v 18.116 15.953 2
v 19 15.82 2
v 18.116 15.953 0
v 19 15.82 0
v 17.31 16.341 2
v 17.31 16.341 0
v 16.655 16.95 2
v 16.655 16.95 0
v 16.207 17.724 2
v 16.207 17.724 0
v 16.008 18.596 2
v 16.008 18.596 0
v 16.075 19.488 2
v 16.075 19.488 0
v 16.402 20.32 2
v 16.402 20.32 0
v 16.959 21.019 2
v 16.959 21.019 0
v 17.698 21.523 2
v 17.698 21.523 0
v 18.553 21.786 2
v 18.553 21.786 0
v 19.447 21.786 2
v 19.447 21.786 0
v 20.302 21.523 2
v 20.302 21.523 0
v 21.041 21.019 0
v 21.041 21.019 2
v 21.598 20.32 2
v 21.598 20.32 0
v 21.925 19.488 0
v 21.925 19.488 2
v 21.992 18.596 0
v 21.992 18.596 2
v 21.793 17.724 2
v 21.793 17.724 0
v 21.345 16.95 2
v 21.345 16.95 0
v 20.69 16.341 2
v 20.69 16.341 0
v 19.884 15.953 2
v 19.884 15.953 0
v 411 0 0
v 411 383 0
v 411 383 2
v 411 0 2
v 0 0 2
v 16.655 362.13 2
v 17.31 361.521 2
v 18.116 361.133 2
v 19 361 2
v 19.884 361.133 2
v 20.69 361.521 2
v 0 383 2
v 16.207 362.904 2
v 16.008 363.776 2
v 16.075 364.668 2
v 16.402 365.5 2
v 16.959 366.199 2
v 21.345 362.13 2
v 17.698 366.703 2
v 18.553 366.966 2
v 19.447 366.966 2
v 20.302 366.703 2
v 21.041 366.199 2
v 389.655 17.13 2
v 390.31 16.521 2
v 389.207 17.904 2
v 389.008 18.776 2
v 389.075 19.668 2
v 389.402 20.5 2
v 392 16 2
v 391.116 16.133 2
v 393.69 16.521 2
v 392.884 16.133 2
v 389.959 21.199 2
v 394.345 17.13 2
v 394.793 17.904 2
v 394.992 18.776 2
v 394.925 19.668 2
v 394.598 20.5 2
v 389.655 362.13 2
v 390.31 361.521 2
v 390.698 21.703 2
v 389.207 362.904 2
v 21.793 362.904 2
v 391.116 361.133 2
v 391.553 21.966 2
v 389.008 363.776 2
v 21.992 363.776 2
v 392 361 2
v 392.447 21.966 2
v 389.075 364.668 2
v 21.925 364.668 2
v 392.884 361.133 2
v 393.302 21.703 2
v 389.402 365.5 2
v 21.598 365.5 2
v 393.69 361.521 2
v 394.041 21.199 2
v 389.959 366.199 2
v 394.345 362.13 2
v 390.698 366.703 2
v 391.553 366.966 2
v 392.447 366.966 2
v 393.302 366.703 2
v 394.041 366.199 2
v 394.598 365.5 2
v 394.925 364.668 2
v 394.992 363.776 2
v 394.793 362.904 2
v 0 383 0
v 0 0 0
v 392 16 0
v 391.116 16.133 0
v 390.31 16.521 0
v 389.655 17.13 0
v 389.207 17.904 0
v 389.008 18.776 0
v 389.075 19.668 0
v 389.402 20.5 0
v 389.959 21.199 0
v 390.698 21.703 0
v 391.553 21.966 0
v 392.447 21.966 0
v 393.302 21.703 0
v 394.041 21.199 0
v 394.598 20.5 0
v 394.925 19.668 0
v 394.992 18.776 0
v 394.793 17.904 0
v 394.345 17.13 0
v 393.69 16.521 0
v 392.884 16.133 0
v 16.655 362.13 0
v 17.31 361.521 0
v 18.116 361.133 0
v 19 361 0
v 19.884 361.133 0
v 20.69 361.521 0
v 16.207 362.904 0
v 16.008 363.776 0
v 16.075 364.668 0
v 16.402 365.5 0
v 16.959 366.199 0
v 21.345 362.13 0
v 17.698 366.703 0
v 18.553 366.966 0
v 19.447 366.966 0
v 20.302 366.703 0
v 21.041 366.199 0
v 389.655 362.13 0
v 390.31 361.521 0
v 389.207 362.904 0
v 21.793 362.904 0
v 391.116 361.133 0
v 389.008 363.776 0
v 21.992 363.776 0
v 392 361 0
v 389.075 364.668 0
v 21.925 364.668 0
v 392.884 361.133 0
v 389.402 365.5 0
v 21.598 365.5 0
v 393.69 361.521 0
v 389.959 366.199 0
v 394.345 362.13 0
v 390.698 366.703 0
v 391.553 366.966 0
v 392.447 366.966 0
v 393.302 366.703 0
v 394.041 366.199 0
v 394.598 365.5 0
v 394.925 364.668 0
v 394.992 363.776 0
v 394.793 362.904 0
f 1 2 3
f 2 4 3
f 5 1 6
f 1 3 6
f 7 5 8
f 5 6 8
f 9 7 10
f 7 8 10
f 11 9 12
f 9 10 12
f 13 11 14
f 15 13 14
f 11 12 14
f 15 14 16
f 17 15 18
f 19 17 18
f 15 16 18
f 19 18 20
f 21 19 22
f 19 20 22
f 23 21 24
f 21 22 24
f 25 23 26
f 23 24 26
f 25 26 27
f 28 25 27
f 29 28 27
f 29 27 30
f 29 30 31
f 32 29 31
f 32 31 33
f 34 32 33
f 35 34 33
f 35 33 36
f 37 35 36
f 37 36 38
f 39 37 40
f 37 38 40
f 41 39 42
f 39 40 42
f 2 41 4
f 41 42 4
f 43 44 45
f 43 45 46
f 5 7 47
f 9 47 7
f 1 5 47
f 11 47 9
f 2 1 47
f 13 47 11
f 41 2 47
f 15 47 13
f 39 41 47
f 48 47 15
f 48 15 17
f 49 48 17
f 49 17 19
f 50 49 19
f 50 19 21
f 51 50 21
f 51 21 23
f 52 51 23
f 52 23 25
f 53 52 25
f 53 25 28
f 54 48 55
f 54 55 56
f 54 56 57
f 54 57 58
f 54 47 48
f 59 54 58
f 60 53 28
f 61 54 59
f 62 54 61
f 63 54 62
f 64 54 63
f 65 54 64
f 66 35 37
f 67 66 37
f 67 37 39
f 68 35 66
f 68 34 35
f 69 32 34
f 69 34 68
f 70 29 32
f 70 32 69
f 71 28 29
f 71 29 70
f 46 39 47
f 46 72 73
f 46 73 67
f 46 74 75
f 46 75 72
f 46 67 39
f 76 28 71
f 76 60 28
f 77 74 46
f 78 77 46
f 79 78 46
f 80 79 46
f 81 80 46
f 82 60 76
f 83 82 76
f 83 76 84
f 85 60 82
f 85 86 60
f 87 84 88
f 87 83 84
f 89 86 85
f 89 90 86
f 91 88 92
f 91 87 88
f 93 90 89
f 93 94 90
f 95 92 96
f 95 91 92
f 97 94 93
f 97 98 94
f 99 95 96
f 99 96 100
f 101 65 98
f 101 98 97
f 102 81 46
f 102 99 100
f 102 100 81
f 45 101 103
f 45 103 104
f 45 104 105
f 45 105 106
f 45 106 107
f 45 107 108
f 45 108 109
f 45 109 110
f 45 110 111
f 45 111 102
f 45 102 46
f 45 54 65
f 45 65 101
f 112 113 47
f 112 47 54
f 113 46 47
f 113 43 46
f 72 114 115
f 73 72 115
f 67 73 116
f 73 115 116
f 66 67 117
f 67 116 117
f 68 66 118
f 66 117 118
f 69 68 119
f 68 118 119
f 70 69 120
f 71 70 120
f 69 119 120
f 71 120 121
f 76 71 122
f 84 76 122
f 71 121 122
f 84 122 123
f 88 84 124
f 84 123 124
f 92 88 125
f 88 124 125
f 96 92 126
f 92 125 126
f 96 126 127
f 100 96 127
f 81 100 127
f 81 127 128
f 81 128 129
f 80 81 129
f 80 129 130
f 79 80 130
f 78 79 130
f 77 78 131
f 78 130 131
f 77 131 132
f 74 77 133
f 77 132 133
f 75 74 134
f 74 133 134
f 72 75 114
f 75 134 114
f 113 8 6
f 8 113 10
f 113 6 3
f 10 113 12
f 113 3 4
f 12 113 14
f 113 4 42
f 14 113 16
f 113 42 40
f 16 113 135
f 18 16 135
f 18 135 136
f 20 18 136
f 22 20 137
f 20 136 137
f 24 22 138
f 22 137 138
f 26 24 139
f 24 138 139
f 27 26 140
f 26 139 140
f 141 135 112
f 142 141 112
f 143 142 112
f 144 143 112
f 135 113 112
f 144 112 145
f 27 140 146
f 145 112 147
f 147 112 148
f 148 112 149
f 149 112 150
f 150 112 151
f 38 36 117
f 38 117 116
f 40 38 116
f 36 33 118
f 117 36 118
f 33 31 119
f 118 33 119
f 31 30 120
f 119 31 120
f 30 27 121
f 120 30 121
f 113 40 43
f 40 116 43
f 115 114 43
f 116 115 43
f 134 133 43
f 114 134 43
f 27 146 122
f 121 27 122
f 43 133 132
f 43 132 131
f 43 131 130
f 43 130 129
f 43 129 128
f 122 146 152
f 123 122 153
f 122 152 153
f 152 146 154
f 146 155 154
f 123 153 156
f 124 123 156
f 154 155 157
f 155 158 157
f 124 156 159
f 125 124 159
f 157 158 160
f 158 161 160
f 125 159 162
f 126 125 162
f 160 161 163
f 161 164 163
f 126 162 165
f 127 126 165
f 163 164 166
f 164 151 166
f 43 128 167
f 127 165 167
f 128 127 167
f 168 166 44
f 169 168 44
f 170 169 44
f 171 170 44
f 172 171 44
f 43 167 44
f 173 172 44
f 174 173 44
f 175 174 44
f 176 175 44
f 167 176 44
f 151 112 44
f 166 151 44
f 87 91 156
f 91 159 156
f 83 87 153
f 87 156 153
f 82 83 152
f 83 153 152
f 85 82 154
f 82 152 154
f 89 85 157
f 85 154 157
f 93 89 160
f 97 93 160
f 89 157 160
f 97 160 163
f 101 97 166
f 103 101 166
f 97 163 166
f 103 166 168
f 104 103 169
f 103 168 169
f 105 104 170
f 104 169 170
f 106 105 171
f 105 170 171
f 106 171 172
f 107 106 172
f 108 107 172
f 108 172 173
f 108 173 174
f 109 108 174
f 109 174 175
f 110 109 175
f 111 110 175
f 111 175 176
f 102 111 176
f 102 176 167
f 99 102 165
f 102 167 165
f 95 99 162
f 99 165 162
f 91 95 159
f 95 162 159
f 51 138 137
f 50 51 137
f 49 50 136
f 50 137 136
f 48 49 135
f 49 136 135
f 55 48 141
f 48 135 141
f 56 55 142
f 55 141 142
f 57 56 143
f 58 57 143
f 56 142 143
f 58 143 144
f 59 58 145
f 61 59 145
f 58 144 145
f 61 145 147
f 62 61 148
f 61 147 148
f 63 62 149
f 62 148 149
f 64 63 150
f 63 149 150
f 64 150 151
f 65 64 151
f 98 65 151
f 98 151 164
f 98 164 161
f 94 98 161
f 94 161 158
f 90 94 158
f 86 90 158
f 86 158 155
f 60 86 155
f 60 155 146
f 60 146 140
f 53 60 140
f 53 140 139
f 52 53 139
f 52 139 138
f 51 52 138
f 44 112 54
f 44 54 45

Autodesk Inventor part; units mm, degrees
ref_plane "YZ Plane" through (0, 0, 0) normal (1, 0, 0) x (0, 1, 0)
ref_plane "XZ Plane" through (0, 0, 0) normal (0, 1, 0) x (-1, 0, 0)
ref_plane "XY Plane" through (0, 0, 0) normal (0, 0, 1) x (1, 0, 0)
sketch "Sketch1" plane through (0, 0, 0) normal (0, 0, 1) x (1, 0, 0)
  line L0 (0, 0) -> (0, 383)
  line L1 (0, 383) -> (411, 383)
  line L2 (411, 383) -> (411, 0)
  line L3 (411, 0) -> (0, 0)
  dimension "d0" = 383
  dimension "d1" = 411
extrude "Extrusion1" add sketch "Sketch1" along normal blind 2
sketch "Sketch2" plane through (0, 0, 2) normal (0, 0, 1) x (1, 0, 0)
  line L0 (0, 383) -> (0, 0) projected
  line L1 (0, 0) -> (0, 19)
  line L2 (0, 19) -> (19, 19)
  circle A0 centre (19, 19) radius 3
  point P0 (19, 18.82)
  dimension "d44" = 19
  dimension "d46" = 19
  dimension "d47" = 6
hole "Hole1" at (19, 18.82, 2) direction (0, 0, -1) diameter 6 end through all
sketch "Sketch3" plane through (0, 0, 2) normal (0, 0, 1) x (1, 0, 0)
  line L0 (411, 0) -> (0, 0) projected
  line L1 (411, 0) -> (411, 383) projected
  line L2 (411, 0) -> (411, 19)
  line L3 (411, 19) -> (392, 19)
  circle A0 centre (392, 19) radius 3
  dimension "d49" = 19
  dimension "d50" = 19
  dimension "d51" = 6
hole "Hole2" at (392, 19, 2) direction (0, 0, -1) diameter 6 end through all
sketch "Sketch4" plane through (0, 0, 2) normal (0, 0, 1) x (1, 0, 0)
  line L0 (0, 383) -> (0, 0) projected
  line L1 (0, 383) -> (0, 364)
  line L2 (0, 364) -> (19, 364)
  circle A0 centre (19, 364) radius 3
  dimension "d53" = 19
  dimension "d54" = 19
  dimension "d55" = 6
hole "Hole3" at (19, 364, 2) direction (0, 0, -1) diameter 6 end through all
sketch "Sketch5" plane through (0, 0, 2) normal (0, 0, 1) x (1, 0, 0)
  line L0 (411, 383) -> (0, 383) projected
  line L1 (411, 383) -> (411, 364)
  line L2 (411, 0) -> (411, 383) projected
  line L3 (411, 364) -> (392, 364)
  circle A0 centre (392, 364) radius 3
  point P0 (0, 0)
  dimension "d56" = 19
  dimension "d57" = 19
  dimension "d58" = 6
hole "Hole4" at (392, 364, 2) direction (0, 0, -1) diameter 6 end through all
properties part number "bundplade" material "Steel"
